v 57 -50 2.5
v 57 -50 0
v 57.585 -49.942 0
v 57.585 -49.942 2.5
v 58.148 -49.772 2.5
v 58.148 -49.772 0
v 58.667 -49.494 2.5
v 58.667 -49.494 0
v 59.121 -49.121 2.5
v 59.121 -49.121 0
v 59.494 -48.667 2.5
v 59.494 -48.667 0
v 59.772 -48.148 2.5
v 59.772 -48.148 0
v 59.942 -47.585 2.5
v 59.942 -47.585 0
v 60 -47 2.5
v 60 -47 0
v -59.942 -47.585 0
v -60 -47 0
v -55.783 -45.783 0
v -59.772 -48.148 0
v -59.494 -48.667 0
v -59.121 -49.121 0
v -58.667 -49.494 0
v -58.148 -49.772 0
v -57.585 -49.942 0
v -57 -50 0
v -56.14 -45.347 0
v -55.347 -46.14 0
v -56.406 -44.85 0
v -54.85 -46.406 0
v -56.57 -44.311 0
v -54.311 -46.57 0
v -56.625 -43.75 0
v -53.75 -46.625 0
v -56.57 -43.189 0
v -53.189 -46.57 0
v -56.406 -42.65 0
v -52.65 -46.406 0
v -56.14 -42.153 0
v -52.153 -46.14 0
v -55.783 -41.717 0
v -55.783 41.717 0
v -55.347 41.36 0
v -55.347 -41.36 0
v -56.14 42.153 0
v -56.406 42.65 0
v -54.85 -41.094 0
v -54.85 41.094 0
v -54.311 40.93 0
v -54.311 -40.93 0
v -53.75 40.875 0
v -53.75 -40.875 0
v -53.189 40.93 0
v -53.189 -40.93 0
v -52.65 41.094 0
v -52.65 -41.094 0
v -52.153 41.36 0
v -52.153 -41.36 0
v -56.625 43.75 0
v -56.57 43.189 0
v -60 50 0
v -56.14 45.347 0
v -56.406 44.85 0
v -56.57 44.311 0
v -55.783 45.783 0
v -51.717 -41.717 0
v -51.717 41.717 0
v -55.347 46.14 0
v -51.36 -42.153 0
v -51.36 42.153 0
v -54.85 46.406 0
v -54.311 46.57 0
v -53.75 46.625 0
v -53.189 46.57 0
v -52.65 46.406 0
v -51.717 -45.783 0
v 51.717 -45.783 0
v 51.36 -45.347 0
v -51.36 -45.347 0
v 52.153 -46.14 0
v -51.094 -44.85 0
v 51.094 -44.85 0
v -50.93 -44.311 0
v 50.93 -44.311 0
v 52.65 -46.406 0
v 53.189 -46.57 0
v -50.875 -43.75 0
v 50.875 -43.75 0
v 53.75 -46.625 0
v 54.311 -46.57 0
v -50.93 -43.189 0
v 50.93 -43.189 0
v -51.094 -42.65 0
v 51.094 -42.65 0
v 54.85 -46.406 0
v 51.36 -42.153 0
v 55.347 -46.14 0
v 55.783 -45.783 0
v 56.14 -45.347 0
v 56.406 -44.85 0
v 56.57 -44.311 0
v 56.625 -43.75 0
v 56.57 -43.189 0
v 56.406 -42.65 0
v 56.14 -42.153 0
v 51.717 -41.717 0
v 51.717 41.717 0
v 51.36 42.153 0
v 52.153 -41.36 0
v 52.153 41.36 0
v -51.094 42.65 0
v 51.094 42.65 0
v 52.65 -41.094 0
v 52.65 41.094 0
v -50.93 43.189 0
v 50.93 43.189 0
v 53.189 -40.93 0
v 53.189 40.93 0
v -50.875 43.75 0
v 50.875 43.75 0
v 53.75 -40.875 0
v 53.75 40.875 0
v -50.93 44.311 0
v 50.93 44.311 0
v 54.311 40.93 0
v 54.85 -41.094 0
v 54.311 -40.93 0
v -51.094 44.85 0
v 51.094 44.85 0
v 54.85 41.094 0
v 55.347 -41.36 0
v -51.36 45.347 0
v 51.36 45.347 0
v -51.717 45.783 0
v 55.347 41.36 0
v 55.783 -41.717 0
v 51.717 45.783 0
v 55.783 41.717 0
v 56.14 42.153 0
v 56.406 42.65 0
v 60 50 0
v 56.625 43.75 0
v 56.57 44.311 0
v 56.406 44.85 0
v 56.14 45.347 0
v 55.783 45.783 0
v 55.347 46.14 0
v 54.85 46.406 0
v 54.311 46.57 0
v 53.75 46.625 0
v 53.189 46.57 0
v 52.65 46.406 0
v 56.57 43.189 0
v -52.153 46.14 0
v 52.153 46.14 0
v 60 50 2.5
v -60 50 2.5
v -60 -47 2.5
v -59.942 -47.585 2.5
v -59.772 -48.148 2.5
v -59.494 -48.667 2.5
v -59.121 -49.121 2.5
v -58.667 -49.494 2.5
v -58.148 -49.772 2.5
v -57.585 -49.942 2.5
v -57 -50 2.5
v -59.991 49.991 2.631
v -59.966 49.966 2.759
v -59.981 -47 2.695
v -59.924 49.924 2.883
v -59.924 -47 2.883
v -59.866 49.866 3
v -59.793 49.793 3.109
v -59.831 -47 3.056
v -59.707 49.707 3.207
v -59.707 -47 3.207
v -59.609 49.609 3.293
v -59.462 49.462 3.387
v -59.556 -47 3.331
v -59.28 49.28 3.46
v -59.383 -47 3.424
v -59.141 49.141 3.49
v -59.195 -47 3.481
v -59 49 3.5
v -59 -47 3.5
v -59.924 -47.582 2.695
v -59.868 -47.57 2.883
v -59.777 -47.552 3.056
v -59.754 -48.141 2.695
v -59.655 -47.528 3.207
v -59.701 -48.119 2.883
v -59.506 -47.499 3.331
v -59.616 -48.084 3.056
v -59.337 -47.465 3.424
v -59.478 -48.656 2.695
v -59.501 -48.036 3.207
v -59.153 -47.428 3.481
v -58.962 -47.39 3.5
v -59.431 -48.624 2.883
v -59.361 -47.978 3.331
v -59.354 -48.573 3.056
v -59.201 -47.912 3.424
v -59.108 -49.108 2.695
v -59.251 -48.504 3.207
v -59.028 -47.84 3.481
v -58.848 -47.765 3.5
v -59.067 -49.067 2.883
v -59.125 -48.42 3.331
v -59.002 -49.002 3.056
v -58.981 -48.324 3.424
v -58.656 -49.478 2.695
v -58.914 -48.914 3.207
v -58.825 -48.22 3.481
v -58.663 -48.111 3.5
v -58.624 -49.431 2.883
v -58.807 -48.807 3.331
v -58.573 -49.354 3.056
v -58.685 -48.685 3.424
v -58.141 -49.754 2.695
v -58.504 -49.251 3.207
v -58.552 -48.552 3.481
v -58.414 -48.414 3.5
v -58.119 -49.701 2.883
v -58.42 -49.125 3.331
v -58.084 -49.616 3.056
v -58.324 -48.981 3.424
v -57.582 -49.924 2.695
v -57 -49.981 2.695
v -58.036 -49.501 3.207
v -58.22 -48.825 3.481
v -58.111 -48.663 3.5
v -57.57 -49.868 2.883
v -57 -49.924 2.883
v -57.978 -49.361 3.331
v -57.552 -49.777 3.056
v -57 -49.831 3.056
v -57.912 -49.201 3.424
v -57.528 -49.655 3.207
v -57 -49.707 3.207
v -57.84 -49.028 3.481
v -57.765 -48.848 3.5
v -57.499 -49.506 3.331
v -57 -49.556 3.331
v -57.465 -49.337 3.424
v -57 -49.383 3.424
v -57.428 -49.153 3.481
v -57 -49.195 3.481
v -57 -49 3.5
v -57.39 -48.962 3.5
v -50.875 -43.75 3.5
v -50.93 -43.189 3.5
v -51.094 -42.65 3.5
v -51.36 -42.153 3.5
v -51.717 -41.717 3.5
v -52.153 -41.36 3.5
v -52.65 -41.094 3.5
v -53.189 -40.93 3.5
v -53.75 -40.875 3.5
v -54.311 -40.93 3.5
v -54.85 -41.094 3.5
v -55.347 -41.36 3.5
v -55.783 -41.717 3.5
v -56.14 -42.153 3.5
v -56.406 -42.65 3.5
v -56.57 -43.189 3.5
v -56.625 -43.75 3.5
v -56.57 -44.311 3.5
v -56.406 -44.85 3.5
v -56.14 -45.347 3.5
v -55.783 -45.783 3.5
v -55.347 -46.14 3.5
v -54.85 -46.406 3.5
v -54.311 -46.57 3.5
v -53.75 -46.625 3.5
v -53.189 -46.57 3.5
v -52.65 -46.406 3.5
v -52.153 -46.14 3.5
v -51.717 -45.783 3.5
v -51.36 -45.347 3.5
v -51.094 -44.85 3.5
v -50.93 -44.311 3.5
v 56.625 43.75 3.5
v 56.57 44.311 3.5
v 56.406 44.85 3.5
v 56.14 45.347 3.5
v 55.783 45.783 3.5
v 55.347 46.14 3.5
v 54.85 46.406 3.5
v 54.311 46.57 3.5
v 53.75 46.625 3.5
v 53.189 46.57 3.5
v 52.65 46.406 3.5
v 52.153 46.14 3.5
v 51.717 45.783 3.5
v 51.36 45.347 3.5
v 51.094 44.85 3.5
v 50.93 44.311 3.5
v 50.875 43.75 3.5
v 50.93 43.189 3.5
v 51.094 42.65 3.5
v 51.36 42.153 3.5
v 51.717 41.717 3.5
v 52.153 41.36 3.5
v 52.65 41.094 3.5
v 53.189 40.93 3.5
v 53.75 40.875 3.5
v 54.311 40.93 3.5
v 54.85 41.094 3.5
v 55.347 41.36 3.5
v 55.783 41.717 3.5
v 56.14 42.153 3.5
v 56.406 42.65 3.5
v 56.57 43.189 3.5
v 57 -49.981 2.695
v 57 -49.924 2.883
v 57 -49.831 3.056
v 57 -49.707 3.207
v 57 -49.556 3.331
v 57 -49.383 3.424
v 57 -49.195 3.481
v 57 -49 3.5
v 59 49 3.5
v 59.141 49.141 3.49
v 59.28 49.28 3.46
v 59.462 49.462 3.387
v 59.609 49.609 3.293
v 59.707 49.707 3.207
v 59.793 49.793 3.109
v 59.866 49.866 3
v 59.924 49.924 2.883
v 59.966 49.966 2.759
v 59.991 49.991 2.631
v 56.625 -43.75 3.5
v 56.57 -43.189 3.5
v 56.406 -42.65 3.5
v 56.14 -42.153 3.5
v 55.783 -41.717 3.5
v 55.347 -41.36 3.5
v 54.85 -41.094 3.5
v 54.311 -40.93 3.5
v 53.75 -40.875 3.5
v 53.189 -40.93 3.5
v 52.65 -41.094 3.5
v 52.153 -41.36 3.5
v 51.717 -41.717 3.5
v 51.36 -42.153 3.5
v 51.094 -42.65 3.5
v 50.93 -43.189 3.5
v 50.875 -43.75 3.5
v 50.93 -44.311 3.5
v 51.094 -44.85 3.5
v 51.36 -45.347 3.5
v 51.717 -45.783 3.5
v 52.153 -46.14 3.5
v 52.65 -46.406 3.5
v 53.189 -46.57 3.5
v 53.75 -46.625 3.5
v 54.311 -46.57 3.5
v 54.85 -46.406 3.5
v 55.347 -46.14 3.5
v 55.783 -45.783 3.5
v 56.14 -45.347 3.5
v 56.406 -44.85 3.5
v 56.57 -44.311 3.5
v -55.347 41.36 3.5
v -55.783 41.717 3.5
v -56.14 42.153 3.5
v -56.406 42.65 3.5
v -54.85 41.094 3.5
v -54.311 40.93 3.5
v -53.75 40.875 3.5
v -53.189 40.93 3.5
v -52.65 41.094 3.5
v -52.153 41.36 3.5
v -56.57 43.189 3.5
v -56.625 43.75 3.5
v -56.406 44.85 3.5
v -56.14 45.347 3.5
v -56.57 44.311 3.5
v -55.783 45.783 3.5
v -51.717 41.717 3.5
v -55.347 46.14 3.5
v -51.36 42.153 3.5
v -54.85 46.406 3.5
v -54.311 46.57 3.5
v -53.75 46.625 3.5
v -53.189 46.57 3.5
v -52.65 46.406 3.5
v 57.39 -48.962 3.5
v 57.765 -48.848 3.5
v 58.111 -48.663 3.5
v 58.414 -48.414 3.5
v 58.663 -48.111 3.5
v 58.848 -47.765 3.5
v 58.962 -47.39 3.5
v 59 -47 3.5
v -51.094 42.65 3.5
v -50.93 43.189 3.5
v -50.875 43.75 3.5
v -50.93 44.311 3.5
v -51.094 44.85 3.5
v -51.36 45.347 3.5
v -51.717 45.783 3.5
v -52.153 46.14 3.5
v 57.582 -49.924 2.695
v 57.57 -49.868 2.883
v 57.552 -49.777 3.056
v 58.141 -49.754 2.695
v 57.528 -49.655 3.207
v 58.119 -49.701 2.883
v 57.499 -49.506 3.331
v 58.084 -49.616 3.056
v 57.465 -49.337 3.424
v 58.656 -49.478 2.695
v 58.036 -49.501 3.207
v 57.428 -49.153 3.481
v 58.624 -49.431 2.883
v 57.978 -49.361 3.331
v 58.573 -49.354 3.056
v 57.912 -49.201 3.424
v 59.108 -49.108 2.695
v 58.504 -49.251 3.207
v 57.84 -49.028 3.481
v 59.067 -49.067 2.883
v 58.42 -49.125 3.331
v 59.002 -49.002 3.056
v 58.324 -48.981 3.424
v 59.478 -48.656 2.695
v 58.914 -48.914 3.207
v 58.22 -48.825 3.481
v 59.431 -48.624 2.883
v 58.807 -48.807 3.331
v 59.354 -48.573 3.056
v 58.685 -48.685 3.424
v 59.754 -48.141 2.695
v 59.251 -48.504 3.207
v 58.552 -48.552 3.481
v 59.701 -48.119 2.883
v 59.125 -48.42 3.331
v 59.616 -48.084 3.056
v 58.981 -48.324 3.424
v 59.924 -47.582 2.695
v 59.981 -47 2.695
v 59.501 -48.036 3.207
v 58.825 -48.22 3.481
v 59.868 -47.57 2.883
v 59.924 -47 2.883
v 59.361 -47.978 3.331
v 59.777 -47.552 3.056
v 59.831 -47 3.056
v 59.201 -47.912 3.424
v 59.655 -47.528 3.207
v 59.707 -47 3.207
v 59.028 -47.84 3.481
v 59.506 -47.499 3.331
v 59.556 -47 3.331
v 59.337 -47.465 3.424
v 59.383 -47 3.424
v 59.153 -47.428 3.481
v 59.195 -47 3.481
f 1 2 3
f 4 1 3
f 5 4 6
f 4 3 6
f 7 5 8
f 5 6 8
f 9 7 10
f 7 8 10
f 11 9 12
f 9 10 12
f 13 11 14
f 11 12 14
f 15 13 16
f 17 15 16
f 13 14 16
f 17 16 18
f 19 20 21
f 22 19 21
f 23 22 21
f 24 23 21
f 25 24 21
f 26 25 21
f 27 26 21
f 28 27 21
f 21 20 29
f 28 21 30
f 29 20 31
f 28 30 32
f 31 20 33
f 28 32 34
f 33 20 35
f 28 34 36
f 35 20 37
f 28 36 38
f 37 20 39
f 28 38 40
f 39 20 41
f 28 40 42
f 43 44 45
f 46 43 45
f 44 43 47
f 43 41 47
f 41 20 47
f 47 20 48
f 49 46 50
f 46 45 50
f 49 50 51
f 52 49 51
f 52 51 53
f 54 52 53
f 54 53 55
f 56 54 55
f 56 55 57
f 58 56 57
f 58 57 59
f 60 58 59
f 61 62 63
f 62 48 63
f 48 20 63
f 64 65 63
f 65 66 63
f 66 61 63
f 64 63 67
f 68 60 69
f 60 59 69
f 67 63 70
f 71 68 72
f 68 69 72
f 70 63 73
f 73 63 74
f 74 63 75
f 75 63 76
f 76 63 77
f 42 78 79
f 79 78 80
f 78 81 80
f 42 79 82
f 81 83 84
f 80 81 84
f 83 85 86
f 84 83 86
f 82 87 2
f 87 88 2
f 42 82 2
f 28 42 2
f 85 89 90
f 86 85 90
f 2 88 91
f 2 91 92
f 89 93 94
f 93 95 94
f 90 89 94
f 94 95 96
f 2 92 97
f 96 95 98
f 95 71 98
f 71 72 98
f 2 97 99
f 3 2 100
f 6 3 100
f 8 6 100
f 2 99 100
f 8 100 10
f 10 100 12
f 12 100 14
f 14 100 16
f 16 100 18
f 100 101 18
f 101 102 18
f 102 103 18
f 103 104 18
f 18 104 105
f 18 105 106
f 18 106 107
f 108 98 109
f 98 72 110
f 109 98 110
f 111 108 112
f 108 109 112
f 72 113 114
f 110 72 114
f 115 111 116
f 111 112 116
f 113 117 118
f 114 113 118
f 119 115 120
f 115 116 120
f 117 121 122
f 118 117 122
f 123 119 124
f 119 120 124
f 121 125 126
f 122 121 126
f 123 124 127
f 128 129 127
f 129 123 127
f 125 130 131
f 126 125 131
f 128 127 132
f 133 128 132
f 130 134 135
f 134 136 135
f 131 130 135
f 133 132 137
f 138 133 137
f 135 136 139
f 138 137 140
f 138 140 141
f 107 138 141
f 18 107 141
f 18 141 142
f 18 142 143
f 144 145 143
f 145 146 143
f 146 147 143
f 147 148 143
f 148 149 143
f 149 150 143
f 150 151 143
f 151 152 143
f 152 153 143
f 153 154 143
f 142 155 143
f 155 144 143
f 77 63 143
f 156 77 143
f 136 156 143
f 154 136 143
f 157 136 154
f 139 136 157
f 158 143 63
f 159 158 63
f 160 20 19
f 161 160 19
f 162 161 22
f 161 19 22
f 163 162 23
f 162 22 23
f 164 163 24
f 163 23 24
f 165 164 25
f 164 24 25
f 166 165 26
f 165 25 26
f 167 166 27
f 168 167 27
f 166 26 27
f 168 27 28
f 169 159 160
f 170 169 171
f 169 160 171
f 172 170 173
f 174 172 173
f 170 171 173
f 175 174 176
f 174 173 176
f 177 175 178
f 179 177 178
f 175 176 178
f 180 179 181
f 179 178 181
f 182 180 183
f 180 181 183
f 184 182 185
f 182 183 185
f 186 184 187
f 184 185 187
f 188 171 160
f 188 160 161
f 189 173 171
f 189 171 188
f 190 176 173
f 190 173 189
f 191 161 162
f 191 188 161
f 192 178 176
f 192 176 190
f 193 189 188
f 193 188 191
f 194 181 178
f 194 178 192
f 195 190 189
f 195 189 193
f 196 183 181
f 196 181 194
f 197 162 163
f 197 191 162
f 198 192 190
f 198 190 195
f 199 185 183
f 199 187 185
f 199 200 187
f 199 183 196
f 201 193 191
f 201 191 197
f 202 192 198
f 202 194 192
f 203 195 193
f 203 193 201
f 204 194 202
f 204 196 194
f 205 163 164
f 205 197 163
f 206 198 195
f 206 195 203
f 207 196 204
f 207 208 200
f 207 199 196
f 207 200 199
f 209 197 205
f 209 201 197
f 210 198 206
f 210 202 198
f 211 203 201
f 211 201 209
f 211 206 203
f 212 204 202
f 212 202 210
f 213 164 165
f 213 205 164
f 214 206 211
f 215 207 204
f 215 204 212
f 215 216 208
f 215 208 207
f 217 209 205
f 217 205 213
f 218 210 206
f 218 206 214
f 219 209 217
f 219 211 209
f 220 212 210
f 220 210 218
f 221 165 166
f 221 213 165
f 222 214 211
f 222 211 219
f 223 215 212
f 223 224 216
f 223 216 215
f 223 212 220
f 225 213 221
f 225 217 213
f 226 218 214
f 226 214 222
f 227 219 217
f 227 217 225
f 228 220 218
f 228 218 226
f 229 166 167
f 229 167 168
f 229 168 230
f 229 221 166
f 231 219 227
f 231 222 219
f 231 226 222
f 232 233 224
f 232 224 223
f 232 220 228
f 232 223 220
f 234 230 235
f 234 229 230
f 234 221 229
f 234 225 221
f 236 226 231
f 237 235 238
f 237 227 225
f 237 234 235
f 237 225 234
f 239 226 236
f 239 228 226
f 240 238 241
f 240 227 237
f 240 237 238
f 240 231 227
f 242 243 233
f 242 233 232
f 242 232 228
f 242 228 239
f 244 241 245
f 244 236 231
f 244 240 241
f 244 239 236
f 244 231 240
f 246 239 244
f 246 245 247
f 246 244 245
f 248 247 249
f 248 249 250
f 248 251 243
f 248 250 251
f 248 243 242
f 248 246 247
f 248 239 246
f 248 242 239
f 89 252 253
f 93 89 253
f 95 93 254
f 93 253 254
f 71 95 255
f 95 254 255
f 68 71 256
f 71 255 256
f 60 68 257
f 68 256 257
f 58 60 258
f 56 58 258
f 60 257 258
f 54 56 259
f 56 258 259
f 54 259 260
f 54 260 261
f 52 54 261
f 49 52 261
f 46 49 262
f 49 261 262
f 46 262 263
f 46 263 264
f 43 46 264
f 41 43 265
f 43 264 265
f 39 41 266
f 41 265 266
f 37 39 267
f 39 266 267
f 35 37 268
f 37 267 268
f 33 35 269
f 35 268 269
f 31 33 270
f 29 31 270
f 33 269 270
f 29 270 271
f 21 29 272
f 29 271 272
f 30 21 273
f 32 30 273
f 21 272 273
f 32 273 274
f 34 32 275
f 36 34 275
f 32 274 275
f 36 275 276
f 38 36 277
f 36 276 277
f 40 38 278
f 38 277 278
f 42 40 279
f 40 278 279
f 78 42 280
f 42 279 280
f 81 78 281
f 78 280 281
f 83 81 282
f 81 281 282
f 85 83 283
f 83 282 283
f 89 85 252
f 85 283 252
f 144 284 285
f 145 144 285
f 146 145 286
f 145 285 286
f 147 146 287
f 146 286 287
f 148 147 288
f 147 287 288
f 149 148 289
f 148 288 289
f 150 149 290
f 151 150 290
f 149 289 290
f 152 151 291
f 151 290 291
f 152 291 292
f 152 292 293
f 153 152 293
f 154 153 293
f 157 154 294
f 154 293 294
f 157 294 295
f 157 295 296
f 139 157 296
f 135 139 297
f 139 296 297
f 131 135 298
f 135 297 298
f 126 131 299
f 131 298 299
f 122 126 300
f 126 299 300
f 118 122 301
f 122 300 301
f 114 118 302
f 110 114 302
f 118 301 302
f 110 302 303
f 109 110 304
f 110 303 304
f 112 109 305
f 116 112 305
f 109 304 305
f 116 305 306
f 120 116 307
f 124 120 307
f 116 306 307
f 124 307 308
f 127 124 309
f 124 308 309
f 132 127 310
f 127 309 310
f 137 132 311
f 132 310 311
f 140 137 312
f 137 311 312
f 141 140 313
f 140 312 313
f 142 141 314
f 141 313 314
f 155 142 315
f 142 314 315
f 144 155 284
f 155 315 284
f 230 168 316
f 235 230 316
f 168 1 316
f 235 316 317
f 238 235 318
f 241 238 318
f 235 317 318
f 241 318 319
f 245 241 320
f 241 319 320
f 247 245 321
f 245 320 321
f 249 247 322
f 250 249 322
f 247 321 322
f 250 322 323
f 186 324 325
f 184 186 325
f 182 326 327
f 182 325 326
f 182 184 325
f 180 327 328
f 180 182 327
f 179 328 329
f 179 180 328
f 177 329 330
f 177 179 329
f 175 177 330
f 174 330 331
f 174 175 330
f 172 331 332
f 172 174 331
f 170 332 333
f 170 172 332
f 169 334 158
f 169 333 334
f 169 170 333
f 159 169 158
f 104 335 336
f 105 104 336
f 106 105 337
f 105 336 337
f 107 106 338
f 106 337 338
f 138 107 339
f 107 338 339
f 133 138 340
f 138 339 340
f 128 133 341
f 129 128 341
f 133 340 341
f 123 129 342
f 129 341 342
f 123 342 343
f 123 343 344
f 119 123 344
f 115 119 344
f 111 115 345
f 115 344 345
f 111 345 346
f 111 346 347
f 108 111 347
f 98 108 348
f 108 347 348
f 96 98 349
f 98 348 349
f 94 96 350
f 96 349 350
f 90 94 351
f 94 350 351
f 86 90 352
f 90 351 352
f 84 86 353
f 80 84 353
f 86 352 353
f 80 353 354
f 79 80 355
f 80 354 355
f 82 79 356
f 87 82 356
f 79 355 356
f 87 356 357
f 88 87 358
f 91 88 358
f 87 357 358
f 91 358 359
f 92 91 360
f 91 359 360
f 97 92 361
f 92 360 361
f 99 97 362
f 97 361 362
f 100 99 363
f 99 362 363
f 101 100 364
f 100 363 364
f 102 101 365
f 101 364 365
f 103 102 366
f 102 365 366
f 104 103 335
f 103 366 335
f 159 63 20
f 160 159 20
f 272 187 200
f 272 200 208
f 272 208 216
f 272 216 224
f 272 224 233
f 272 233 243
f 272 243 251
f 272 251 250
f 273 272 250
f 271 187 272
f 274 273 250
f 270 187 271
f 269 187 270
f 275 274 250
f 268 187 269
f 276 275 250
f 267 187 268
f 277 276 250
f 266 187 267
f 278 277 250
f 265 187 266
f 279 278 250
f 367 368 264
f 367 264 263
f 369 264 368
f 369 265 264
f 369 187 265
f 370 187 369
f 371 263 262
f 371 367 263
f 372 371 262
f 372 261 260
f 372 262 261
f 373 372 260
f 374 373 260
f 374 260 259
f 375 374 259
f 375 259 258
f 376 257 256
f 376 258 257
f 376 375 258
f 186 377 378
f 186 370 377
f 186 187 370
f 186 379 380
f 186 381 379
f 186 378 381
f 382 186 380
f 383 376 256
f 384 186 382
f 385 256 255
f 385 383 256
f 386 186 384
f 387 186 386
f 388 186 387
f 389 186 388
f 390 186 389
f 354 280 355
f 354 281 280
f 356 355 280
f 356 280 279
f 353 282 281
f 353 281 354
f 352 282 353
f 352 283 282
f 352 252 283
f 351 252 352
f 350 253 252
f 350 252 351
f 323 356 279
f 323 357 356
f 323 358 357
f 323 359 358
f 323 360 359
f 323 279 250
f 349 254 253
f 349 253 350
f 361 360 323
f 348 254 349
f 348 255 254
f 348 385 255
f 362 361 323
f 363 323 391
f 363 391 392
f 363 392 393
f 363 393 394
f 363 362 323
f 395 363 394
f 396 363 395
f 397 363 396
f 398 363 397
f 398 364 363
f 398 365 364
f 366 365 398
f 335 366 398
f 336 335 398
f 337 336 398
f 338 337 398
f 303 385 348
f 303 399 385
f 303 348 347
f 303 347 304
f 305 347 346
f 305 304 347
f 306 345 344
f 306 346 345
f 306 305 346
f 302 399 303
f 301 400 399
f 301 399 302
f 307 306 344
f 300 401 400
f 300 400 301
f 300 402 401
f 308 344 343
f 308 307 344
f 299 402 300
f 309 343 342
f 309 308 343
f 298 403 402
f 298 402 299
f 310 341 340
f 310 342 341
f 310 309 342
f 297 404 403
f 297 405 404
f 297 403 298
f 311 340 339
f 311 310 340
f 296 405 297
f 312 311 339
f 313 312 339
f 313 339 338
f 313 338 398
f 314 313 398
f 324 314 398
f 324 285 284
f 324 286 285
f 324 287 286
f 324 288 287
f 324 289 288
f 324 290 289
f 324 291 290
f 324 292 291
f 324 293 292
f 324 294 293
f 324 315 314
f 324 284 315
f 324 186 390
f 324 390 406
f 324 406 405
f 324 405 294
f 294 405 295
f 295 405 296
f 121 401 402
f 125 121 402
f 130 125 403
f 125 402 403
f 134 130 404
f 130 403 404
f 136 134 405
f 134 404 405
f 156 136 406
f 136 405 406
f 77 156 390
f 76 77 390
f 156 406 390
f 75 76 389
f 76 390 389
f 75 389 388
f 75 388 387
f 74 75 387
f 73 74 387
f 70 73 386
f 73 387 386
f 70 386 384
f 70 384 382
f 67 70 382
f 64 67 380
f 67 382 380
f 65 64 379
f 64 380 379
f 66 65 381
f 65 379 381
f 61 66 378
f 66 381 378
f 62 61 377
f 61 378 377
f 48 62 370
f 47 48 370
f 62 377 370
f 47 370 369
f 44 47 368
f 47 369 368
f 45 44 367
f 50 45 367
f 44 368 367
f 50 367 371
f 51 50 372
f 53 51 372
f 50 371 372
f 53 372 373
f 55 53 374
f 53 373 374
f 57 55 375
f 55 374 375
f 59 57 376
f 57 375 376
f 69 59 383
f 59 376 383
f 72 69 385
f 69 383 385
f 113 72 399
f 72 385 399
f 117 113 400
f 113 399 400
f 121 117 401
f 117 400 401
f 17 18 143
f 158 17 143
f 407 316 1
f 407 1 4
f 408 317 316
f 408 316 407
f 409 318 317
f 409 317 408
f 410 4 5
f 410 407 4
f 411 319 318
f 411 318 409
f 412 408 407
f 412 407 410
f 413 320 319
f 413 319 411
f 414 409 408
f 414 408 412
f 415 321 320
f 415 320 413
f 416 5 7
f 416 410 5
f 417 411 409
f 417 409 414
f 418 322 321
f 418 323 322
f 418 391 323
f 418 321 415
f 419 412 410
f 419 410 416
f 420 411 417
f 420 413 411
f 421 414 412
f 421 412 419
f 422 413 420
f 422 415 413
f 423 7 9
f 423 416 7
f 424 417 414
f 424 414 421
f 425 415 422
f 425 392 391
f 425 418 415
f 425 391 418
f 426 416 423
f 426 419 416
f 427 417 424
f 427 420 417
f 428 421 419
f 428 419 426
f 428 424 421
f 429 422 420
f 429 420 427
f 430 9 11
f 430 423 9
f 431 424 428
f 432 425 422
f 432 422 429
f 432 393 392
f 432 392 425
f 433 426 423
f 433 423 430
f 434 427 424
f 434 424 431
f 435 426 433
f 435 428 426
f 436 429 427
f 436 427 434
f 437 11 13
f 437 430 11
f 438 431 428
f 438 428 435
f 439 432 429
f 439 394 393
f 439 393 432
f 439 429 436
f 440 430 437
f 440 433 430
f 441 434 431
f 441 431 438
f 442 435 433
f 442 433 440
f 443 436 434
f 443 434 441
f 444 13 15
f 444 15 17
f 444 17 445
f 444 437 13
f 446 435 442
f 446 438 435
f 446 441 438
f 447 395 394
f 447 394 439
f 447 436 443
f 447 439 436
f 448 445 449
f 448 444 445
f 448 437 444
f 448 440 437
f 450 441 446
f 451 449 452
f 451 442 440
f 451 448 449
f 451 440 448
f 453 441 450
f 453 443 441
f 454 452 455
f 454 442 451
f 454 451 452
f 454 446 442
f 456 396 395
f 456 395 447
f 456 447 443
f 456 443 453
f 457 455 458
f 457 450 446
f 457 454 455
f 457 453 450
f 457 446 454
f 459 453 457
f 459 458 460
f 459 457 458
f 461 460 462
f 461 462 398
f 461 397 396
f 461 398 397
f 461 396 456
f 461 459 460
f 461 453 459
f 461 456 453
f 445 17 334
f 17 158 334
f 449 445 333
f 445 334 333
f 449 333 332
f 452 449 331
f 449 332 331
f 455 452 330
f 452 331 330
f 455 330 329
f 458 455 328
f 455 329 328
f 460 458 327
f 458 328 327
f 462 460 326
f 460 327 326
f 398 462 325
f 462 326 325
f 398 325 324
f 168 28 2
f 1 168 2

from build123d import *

# Parameters (mm, degrees)
F1_DEPTH = 3.5
F2_R     = 2.875
F3_DEPTH = 3.5
F4_R     = 1


with BuildPart() as f1:
    # F0 (on Top) → F1 (new body)
    with BuildSketch(Plane.XY):
        with BuildLine():
            Line((-57, -50), (57, -50))
            ThreePointArc((57, -50), (59.12132, -49.12132), (60, -47))
            Line((60, -47), (60, 50))
            Line((60, 50), (-60, 50))
            Line((-60, 50), (-60, -47))
            ThreePointArc((-60, -47), (-59.12132, -49.12132), (-57, -50))
        make_face()
    extrude(amount=F1_DEPTH)

    # F2 (on face) → F3 (cut, through all)
    with BuildSketch(Plane.XY.offset(3.5)):
        with Locations((-53.75, 43.75)):
            Circle(F2_R)
        with Locations((53.75, 43.75)):
            Circle(F2_R)
        with Locations((-53.75, -43.75)):
            Circle(F2_R)
        with Locations((53.75, -43.75)):
            Circle(F2_R)
    extrude(amount=-F3_DEPTH, mode=Mode.SUBTRACT)

    # F4
    f4_edges = [f1.edges().sort_by_distance(p)[0] for p in [
        (0, -50, 3.5),
        (-59.12132, -49.12132, 3.5),
        (-60, 1.5, 3.5),
        (0, 50, 3.5),
        (60, 1.5, 3.5),
        (59.12132, -49.12132, 3.5),
    ]]
    fillet(f4_edges, radius=F4_R)


solid = f1.part
